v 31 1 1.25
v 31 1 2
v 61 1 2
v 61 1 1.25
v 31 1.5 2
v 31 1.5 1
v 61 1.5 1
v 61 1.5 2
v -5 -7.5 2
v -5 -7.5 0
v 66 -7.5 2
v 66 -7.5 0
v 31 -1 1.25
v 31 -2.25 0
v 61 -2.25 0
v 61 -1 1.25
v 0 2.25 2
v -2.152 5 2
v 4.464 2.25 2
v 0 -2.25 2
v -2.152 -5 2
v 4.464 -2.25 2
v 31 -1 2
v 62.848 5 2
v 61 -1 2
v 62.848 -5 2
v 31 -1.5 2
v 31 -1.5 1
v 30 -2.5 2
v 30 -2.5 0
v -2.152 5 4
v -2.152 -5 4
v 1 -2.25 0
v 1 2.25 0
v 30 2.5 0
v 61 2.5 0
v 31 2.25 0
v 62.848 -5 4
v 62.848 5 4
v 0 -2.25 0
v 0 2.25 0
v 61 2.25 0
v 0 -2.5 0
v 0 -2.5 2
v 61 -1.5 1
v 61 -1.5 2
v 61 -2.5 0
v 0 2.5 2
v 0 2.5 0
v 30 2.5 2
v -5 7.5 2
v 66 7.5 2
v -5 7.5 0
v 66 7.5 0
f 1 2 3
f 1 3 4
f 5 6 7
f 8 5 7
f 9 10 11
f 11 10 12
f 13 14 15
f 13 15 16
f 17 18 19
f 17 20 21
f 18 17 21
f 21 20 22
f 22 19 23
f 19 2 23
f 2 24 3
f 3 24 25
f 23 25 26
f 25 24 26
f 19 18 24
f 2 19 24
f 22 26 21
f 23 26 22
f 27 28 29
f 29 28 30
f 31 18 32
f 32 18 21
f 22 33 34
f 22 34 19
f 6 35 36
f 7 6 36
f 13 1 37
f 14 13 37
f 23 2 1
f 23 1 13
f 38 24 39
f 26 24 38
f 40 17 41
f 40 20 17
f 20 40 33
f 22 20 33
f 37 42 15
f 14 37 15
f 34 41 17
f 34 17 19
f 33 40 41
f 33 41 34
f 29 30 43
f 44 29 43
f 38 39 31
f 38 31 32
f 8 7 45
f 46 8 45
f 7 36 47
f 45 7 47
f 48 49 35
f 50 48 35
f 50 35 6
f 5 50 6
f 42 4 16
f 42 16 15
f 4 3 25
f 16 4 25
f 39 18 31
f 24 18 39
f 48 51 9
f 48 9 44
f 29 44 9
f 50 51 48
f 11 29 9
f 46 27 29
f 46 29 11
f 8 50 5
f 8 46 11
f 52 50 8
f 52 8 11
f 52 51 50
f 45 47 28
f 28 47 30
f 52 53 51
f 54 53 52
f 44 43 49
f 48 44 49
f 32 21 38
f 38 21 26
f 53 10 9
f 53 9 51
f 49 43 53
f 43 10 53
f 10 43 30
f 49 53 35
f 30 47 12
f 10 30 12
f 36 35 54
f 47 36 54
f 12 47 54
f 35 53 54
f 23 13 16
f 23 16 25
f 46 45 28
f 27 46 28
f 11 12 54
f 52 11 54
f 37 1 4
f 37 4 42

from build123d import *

# Parameters (mm, degrees)
SKETCH_W     = 71
SKETCH_H     = 15
PAD_DEPTH    = 2
CHAMFER_SIZE = 1
PAD001_DEPTH = 30
SKETCH002_W  = 10
SKETCH002_H  = 65
PAD002_DEPTH = 2
PAD003_DEPTH = 2.25


with BuildPart() as test_piece:
    # Sketch → Pad (new body)
    with BuildSketch(Plane.XY):
        with Locations((30.5, 0)):
            Rectangle(SKETCH_W, SKETCH_H)
        Polygon((0, 2.5), (30, 2.5), (31, 1.5), (61, 1.5), (61, -1.5), (31, -1.5), (30, -2.5), (0, -2.5), align=None, mode=Mode.SUBTRACT)
    extrude(amount=PAD_DEPTH)

    # Chamfer
    chamfer_edges = [test_piece.edges().sort_by_distance(p)[0] for p in [
        (46, -1.5, 0),
        (46, 1.5, 0),
    ]]
    chamfer(chamfer_edges, length=CHAMFER_SIZE)


with BuildPart() as body001:
    # Sketch001 (on DatumPlane) → Pad001 (new body)
    with BuildSketch(Plane.YZ.offset(31)):
        Polygon((-1, 2), (1, 2), (1, 1.25), (2.25, 0), (-2.25, 0), (-1, 1.25), align=None)
    extrude(amount=PAD001_DEPTH)

    # Sketch002 (on DatumPlane) → Pad002 (join)
    with BuildSketch(Plane(origin=(31, 0, 2), x_dir=(0, -1, 0), z_dir=(0, 0, 1))):
        with Locations((0, -0.65176)):
            Rectangle(SKETCH002_W, SKETCH002_H)
    extrude(amount=PAD002_DEPTH)

    # Sketch003 (on DatumPlane) → Pad003 (join, symmetric)
    with BuildSketch(Plane.XZ):
        Polygon((0, 2), (0, 0), (1, 0), (4.464102, 2), align=None)
    extrude(amount=PAD003_DEPTH, both=True)


solid = Compound([test_piece.part, body001.part])
